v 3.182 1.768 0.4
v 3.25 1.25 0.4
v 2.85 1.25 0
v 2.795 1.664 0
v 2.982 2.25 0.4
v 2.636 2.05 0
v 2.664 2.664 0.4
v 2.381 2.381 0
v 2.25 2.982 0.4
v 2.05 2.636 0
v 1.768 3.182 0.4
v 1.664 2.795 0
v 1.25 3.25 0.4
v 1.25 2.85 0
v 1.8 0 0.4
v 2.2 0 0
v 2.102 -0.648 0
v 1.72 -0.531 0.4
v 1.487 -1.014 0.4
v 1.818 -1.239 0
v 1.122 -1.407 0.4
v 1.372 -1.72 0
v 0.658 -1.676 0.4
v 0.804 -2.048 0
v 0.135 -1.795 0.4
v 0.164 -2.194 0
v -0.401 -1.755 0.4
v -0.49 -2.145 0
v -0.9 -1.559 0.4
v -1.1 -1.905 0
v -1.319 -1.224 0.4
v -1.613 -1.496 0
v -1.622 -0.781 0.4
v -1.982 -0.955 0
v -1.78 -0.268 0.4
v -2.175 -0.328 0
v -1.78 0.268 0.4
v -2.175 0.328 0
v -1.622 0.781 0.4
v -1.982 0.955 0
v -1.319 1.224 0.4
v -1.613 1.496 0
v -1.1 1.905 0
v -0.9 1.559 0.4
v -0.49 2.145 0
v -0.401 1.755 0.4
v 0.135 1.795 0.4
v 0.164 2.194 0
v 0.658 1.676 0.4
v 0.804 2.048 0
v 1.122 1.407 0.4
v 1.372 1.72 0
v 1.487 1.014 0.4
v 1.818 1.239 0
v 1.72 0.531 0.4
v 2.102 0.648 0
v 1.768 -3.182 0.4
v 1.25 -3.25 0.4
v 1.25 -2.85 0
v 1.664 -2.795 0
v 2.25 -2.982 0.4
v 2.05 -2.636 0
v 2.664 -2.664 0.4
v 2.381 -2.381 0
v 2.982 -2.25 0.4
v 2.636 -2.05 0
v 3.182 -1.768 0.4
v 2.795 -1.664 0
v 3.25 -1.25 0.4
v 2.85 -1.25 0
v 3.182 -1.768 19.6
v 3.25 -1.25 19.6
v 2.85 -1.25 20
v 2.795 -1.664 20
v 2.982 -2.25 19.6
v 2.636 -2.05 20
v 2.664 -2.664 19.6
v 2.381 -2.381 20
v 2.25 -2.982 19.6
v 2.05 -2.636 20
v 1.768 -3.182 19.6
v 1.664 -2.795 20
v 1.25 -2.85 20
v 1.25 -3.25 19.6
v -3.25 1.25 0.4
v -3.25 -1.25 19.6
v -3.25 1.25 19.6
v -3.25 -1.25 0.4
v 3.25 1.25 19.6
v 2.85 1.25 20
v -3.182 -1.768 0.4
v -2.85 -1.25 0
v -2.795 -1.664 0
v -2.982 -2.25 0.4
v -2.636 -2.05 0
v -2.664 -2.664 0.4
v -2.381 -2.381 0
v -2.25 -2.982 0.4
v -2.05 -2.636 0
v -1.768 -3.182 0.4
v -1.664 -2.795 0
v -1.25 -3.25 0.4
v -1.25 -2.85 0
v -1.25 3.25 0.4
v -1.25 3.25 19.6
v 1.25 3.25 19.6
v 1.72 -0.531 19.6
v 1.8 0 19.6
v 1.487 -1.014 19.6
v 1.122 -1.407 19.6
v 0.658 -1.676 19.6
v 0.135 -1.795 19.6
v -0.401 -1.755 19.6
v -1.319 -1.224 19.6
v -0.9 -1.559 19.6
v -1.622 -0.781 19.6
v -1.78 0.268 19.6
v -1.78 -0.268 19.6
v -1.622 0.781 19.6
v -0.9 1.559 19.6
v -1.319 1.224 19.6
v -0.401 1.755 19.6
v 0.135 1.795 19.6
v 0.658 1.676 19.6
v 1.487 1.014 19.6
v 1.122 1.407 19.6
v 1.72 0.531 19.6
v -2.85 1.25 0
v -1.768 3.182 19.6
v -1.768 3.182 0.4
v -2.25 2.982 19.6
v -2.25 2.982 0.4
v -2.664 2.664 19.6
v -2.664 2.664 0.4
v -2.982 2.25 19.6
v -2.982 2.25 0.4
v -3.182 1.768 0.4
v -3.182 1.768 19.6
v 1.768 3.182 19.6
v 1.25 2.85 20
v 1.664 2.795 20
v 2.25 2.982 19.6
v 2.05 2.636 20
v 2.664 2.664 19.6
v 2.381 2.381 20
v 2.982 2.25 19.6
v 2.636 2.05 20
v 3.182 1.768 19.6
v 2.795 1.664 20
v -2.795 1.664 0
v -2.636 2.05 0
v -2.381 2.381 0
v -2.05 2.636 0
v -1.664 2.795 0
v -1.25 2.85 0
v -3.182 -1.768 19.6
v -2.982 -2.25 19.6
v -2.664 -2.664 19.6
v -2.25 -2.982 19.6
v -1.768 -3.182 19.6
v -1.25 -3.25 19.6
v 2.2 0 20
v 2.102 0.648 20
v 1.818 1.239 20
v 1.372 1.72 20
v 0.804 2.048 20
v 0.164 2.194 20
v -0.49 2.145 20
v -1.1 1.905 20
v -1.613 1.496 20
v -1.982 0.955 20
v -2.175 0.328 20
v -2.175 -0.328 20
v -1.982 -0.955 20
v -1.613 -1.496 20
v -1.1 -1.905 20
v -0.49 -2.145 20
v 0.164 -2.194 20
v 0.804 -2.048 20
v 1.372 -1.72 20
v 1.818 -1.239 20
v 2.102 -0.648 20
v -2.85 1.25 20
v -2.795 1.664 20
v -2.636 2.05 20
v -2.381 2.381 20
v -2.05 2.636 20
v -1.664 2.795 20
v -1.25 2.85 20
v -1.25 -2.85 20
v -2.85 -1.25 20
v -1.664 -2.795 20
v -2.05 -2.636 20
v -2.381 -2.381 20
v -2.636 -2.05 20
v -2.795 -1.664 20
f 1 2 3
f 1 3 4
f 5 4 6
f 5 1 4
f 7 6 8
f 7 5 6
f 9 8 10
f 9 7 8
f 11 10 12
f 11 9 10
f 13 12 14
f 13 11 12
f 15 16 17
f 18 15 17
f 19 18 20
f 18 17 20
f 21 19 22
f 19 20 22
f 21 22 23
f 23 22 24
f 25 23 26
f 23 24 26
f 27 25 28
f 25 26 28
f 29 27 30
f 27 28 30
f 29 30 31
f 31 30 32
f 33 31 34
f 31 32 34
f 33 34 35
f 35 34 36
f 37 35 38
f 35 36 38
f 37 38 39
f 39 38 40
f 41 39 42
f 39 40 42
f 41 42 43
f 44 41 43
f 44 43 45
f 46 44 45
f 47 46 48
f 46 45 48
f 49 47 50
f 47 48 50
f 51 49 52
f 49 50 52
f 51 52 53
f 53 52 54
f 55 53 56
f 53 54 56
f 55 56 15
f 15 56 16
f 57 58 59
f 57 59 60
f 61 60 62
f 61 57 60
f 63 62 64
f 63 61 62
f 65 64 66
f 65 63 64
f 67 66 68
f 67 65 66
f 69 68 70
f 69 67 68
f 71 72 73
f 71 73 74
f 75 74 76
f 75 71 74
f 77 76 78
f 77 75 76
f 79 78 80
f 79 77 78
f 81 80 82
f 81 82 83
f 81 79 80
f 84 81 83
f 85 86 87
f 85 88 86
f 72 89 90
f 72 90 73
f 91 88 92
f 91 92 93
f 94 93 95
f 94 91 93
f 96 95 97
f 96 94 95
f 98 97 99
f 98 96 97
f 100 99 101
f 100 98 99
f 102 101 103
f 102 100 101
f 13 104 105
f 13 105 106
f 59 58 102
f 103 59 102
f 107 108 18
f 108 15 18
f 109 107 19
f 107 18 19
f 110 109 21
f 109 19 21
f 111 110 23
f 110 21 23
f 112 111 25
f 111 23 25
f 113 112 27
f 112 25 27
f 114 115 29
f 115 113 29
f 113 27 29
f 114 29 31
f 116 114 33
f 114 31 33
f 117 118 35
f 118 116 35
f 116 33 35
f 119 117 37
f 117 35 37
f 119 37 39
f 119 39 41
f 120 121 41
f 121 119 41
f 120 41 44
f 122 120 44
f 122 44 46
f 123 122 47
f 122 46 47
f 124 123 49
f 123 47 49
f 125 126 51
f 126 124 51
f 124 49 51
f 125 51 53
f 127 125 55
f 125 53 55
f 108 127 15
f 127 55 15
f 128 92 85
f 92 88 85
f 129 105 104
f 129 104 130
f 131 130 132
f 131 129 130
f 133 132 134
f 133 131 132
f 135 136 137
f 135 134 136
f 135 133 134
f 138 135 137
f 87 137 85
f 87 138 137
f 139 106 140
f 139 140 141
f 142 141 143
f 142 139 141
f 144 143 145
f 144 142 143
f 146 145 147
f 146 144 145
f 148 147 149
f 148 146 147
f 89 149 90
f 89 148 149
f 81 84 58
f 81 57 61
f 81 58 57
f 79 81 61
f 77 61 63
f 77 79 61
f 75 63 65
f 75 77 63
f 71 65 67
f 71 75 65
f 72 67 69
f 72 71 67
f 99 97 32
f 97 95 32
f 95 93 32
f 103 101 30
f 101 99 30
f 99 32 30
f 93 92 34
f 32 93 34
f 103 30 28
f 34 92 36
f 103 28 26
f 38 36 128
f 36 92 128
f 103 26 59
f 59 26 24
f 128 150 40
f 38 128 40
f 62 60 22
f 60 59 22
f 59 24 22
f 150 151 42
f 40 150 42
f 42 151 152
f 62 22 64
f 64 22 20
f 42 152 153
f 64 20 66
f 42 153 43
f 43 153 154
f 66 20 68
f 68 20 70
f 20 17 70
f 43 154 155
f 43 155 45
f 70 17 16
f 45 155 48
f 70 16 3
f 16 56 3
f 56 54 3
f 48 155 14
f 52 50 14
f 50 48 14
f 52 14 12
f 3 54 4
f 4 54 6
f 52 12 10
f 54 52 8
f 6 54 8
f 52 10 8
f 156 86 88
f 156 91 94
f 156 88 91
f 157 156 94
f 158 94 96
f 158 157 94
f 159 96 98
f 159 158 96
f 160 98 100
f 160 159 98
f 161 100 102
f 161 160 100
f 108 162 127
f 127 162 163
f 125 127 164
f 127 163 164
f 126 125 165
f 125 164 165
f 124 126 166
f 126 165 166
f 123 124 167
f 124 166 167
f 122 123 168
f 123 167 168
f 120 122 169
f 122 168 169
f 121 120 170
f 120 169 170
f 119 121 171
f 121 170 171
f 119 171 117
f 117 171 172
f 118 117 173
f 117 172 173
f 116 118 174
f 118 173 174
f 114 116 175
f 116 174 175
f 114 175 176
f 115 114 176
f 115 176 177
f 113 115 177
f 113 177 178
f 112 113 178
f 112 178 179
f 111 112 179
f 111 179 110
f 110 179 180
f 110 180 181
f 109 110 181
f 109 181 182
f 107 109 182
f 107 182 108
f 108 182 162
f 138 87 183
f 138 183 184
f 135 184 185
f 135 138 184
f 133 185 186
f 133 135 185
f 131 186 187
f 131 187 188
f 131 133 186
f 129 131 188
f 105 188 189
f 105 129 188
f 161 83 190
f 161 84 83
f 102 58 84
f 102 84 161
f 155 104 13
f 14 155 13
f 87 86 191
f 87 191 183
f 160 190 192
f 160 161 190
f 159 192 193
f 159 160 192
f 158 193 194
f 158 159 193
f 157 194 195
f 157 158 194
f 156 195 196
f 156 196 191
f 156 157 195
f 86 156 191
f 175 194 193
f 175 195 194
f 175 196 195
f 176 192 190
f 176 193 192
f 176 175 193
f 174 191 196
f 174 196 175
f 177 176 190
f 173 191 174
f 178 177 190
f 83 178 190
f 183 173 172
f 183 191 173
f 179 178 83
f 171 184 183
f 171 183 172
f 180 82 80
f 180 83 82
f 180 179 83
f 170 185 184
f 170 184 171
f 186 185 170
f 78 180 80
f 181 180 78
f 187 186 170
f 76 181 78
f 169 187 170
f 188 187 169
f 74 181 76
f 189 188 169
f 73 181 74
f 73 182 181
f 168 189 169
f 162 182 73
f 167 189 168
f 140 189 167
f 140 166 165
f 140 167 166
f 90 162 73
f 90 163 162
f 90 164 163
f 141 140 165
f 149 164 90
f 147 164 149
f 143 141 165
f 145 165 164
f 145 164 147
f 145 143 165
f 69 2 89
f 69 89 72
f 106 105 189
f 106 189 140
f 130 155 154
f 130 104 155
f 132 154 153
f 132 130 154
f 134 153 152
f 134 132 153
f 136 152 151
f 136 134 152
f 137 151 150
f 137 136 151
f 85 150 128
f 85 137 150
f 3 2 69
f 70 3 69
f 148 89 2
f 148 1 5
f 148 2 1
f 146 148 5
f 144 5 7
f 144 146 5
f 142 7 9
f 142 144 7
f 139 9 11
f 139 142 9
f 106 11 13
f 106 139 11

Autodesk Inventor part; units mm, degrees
ref_plane "YZ Plane" through (0, 0, 0) normal (1, 0, 0) x (0, 1, 0)
ref_plane "XZ Plane" through (0, 0, 0) normal (0, 1, 0) x (-1, 0, 0)
ref_plane "XY Plane" through (0, 0, 0) normal (0, 0, 1) x (1, 0, 0)
sketch "Sketch1" plane through (0, 0, 0) normal (0, 0, 1) x (1, 0, 0)
  circle A0 centre (0, 0) radius 1.8
  line L0 (-3.25, 3.25) -> (3.25, 3.25)
  line L1 (3.25, 3.25) -> (3.25, -3.25)
  line L2 (3.25, -3.25) -> (-3.25, -3.25)
  line L3 (-3.25, -3.25) -> (-3.25, 3.25)
  point P0 (3.25, 0)
  point P1 (0, 3.25)
  dimension "d0" = 3.6
  dimension "d24" = 6.5
extrude "Extrusion1" add sketch "Sketch1" along normal blind 20
fillet "Fillet3" radius 2 4 edges at (3.25, 3.25, 10) (3.25, -3.25, 10) (-3.25, -3.25, 10) (-3.25, 3.25, 10)
chamfer "Chamfer4" distance 0.4 angle 45 18 edges at (-2.6642, -2.6642, 20) (-3.25, 0, 20) (-2.6642, 2.6642, 20) (0, 3.25, 20) (2.6642, 2.6642, 20) (3.25, 0, 20) (2.6642, -2.6642, 20) (0, -3.25, 20) (2.6642, -2.6642, 0) (3.25, 0, 0) (2.6642, 2.6642, 0) (0, 3.25, 0) (-2.6642, 2.6642, 0) (-3.25, 0, 0) (-2.6642, -2.6642, 0) (0, -3.25, 0) (-1.8, 0, 20) (-1.8, 0, 0)
properties part number "shaft-20mm-squareipt" material "ABS Plastic"
